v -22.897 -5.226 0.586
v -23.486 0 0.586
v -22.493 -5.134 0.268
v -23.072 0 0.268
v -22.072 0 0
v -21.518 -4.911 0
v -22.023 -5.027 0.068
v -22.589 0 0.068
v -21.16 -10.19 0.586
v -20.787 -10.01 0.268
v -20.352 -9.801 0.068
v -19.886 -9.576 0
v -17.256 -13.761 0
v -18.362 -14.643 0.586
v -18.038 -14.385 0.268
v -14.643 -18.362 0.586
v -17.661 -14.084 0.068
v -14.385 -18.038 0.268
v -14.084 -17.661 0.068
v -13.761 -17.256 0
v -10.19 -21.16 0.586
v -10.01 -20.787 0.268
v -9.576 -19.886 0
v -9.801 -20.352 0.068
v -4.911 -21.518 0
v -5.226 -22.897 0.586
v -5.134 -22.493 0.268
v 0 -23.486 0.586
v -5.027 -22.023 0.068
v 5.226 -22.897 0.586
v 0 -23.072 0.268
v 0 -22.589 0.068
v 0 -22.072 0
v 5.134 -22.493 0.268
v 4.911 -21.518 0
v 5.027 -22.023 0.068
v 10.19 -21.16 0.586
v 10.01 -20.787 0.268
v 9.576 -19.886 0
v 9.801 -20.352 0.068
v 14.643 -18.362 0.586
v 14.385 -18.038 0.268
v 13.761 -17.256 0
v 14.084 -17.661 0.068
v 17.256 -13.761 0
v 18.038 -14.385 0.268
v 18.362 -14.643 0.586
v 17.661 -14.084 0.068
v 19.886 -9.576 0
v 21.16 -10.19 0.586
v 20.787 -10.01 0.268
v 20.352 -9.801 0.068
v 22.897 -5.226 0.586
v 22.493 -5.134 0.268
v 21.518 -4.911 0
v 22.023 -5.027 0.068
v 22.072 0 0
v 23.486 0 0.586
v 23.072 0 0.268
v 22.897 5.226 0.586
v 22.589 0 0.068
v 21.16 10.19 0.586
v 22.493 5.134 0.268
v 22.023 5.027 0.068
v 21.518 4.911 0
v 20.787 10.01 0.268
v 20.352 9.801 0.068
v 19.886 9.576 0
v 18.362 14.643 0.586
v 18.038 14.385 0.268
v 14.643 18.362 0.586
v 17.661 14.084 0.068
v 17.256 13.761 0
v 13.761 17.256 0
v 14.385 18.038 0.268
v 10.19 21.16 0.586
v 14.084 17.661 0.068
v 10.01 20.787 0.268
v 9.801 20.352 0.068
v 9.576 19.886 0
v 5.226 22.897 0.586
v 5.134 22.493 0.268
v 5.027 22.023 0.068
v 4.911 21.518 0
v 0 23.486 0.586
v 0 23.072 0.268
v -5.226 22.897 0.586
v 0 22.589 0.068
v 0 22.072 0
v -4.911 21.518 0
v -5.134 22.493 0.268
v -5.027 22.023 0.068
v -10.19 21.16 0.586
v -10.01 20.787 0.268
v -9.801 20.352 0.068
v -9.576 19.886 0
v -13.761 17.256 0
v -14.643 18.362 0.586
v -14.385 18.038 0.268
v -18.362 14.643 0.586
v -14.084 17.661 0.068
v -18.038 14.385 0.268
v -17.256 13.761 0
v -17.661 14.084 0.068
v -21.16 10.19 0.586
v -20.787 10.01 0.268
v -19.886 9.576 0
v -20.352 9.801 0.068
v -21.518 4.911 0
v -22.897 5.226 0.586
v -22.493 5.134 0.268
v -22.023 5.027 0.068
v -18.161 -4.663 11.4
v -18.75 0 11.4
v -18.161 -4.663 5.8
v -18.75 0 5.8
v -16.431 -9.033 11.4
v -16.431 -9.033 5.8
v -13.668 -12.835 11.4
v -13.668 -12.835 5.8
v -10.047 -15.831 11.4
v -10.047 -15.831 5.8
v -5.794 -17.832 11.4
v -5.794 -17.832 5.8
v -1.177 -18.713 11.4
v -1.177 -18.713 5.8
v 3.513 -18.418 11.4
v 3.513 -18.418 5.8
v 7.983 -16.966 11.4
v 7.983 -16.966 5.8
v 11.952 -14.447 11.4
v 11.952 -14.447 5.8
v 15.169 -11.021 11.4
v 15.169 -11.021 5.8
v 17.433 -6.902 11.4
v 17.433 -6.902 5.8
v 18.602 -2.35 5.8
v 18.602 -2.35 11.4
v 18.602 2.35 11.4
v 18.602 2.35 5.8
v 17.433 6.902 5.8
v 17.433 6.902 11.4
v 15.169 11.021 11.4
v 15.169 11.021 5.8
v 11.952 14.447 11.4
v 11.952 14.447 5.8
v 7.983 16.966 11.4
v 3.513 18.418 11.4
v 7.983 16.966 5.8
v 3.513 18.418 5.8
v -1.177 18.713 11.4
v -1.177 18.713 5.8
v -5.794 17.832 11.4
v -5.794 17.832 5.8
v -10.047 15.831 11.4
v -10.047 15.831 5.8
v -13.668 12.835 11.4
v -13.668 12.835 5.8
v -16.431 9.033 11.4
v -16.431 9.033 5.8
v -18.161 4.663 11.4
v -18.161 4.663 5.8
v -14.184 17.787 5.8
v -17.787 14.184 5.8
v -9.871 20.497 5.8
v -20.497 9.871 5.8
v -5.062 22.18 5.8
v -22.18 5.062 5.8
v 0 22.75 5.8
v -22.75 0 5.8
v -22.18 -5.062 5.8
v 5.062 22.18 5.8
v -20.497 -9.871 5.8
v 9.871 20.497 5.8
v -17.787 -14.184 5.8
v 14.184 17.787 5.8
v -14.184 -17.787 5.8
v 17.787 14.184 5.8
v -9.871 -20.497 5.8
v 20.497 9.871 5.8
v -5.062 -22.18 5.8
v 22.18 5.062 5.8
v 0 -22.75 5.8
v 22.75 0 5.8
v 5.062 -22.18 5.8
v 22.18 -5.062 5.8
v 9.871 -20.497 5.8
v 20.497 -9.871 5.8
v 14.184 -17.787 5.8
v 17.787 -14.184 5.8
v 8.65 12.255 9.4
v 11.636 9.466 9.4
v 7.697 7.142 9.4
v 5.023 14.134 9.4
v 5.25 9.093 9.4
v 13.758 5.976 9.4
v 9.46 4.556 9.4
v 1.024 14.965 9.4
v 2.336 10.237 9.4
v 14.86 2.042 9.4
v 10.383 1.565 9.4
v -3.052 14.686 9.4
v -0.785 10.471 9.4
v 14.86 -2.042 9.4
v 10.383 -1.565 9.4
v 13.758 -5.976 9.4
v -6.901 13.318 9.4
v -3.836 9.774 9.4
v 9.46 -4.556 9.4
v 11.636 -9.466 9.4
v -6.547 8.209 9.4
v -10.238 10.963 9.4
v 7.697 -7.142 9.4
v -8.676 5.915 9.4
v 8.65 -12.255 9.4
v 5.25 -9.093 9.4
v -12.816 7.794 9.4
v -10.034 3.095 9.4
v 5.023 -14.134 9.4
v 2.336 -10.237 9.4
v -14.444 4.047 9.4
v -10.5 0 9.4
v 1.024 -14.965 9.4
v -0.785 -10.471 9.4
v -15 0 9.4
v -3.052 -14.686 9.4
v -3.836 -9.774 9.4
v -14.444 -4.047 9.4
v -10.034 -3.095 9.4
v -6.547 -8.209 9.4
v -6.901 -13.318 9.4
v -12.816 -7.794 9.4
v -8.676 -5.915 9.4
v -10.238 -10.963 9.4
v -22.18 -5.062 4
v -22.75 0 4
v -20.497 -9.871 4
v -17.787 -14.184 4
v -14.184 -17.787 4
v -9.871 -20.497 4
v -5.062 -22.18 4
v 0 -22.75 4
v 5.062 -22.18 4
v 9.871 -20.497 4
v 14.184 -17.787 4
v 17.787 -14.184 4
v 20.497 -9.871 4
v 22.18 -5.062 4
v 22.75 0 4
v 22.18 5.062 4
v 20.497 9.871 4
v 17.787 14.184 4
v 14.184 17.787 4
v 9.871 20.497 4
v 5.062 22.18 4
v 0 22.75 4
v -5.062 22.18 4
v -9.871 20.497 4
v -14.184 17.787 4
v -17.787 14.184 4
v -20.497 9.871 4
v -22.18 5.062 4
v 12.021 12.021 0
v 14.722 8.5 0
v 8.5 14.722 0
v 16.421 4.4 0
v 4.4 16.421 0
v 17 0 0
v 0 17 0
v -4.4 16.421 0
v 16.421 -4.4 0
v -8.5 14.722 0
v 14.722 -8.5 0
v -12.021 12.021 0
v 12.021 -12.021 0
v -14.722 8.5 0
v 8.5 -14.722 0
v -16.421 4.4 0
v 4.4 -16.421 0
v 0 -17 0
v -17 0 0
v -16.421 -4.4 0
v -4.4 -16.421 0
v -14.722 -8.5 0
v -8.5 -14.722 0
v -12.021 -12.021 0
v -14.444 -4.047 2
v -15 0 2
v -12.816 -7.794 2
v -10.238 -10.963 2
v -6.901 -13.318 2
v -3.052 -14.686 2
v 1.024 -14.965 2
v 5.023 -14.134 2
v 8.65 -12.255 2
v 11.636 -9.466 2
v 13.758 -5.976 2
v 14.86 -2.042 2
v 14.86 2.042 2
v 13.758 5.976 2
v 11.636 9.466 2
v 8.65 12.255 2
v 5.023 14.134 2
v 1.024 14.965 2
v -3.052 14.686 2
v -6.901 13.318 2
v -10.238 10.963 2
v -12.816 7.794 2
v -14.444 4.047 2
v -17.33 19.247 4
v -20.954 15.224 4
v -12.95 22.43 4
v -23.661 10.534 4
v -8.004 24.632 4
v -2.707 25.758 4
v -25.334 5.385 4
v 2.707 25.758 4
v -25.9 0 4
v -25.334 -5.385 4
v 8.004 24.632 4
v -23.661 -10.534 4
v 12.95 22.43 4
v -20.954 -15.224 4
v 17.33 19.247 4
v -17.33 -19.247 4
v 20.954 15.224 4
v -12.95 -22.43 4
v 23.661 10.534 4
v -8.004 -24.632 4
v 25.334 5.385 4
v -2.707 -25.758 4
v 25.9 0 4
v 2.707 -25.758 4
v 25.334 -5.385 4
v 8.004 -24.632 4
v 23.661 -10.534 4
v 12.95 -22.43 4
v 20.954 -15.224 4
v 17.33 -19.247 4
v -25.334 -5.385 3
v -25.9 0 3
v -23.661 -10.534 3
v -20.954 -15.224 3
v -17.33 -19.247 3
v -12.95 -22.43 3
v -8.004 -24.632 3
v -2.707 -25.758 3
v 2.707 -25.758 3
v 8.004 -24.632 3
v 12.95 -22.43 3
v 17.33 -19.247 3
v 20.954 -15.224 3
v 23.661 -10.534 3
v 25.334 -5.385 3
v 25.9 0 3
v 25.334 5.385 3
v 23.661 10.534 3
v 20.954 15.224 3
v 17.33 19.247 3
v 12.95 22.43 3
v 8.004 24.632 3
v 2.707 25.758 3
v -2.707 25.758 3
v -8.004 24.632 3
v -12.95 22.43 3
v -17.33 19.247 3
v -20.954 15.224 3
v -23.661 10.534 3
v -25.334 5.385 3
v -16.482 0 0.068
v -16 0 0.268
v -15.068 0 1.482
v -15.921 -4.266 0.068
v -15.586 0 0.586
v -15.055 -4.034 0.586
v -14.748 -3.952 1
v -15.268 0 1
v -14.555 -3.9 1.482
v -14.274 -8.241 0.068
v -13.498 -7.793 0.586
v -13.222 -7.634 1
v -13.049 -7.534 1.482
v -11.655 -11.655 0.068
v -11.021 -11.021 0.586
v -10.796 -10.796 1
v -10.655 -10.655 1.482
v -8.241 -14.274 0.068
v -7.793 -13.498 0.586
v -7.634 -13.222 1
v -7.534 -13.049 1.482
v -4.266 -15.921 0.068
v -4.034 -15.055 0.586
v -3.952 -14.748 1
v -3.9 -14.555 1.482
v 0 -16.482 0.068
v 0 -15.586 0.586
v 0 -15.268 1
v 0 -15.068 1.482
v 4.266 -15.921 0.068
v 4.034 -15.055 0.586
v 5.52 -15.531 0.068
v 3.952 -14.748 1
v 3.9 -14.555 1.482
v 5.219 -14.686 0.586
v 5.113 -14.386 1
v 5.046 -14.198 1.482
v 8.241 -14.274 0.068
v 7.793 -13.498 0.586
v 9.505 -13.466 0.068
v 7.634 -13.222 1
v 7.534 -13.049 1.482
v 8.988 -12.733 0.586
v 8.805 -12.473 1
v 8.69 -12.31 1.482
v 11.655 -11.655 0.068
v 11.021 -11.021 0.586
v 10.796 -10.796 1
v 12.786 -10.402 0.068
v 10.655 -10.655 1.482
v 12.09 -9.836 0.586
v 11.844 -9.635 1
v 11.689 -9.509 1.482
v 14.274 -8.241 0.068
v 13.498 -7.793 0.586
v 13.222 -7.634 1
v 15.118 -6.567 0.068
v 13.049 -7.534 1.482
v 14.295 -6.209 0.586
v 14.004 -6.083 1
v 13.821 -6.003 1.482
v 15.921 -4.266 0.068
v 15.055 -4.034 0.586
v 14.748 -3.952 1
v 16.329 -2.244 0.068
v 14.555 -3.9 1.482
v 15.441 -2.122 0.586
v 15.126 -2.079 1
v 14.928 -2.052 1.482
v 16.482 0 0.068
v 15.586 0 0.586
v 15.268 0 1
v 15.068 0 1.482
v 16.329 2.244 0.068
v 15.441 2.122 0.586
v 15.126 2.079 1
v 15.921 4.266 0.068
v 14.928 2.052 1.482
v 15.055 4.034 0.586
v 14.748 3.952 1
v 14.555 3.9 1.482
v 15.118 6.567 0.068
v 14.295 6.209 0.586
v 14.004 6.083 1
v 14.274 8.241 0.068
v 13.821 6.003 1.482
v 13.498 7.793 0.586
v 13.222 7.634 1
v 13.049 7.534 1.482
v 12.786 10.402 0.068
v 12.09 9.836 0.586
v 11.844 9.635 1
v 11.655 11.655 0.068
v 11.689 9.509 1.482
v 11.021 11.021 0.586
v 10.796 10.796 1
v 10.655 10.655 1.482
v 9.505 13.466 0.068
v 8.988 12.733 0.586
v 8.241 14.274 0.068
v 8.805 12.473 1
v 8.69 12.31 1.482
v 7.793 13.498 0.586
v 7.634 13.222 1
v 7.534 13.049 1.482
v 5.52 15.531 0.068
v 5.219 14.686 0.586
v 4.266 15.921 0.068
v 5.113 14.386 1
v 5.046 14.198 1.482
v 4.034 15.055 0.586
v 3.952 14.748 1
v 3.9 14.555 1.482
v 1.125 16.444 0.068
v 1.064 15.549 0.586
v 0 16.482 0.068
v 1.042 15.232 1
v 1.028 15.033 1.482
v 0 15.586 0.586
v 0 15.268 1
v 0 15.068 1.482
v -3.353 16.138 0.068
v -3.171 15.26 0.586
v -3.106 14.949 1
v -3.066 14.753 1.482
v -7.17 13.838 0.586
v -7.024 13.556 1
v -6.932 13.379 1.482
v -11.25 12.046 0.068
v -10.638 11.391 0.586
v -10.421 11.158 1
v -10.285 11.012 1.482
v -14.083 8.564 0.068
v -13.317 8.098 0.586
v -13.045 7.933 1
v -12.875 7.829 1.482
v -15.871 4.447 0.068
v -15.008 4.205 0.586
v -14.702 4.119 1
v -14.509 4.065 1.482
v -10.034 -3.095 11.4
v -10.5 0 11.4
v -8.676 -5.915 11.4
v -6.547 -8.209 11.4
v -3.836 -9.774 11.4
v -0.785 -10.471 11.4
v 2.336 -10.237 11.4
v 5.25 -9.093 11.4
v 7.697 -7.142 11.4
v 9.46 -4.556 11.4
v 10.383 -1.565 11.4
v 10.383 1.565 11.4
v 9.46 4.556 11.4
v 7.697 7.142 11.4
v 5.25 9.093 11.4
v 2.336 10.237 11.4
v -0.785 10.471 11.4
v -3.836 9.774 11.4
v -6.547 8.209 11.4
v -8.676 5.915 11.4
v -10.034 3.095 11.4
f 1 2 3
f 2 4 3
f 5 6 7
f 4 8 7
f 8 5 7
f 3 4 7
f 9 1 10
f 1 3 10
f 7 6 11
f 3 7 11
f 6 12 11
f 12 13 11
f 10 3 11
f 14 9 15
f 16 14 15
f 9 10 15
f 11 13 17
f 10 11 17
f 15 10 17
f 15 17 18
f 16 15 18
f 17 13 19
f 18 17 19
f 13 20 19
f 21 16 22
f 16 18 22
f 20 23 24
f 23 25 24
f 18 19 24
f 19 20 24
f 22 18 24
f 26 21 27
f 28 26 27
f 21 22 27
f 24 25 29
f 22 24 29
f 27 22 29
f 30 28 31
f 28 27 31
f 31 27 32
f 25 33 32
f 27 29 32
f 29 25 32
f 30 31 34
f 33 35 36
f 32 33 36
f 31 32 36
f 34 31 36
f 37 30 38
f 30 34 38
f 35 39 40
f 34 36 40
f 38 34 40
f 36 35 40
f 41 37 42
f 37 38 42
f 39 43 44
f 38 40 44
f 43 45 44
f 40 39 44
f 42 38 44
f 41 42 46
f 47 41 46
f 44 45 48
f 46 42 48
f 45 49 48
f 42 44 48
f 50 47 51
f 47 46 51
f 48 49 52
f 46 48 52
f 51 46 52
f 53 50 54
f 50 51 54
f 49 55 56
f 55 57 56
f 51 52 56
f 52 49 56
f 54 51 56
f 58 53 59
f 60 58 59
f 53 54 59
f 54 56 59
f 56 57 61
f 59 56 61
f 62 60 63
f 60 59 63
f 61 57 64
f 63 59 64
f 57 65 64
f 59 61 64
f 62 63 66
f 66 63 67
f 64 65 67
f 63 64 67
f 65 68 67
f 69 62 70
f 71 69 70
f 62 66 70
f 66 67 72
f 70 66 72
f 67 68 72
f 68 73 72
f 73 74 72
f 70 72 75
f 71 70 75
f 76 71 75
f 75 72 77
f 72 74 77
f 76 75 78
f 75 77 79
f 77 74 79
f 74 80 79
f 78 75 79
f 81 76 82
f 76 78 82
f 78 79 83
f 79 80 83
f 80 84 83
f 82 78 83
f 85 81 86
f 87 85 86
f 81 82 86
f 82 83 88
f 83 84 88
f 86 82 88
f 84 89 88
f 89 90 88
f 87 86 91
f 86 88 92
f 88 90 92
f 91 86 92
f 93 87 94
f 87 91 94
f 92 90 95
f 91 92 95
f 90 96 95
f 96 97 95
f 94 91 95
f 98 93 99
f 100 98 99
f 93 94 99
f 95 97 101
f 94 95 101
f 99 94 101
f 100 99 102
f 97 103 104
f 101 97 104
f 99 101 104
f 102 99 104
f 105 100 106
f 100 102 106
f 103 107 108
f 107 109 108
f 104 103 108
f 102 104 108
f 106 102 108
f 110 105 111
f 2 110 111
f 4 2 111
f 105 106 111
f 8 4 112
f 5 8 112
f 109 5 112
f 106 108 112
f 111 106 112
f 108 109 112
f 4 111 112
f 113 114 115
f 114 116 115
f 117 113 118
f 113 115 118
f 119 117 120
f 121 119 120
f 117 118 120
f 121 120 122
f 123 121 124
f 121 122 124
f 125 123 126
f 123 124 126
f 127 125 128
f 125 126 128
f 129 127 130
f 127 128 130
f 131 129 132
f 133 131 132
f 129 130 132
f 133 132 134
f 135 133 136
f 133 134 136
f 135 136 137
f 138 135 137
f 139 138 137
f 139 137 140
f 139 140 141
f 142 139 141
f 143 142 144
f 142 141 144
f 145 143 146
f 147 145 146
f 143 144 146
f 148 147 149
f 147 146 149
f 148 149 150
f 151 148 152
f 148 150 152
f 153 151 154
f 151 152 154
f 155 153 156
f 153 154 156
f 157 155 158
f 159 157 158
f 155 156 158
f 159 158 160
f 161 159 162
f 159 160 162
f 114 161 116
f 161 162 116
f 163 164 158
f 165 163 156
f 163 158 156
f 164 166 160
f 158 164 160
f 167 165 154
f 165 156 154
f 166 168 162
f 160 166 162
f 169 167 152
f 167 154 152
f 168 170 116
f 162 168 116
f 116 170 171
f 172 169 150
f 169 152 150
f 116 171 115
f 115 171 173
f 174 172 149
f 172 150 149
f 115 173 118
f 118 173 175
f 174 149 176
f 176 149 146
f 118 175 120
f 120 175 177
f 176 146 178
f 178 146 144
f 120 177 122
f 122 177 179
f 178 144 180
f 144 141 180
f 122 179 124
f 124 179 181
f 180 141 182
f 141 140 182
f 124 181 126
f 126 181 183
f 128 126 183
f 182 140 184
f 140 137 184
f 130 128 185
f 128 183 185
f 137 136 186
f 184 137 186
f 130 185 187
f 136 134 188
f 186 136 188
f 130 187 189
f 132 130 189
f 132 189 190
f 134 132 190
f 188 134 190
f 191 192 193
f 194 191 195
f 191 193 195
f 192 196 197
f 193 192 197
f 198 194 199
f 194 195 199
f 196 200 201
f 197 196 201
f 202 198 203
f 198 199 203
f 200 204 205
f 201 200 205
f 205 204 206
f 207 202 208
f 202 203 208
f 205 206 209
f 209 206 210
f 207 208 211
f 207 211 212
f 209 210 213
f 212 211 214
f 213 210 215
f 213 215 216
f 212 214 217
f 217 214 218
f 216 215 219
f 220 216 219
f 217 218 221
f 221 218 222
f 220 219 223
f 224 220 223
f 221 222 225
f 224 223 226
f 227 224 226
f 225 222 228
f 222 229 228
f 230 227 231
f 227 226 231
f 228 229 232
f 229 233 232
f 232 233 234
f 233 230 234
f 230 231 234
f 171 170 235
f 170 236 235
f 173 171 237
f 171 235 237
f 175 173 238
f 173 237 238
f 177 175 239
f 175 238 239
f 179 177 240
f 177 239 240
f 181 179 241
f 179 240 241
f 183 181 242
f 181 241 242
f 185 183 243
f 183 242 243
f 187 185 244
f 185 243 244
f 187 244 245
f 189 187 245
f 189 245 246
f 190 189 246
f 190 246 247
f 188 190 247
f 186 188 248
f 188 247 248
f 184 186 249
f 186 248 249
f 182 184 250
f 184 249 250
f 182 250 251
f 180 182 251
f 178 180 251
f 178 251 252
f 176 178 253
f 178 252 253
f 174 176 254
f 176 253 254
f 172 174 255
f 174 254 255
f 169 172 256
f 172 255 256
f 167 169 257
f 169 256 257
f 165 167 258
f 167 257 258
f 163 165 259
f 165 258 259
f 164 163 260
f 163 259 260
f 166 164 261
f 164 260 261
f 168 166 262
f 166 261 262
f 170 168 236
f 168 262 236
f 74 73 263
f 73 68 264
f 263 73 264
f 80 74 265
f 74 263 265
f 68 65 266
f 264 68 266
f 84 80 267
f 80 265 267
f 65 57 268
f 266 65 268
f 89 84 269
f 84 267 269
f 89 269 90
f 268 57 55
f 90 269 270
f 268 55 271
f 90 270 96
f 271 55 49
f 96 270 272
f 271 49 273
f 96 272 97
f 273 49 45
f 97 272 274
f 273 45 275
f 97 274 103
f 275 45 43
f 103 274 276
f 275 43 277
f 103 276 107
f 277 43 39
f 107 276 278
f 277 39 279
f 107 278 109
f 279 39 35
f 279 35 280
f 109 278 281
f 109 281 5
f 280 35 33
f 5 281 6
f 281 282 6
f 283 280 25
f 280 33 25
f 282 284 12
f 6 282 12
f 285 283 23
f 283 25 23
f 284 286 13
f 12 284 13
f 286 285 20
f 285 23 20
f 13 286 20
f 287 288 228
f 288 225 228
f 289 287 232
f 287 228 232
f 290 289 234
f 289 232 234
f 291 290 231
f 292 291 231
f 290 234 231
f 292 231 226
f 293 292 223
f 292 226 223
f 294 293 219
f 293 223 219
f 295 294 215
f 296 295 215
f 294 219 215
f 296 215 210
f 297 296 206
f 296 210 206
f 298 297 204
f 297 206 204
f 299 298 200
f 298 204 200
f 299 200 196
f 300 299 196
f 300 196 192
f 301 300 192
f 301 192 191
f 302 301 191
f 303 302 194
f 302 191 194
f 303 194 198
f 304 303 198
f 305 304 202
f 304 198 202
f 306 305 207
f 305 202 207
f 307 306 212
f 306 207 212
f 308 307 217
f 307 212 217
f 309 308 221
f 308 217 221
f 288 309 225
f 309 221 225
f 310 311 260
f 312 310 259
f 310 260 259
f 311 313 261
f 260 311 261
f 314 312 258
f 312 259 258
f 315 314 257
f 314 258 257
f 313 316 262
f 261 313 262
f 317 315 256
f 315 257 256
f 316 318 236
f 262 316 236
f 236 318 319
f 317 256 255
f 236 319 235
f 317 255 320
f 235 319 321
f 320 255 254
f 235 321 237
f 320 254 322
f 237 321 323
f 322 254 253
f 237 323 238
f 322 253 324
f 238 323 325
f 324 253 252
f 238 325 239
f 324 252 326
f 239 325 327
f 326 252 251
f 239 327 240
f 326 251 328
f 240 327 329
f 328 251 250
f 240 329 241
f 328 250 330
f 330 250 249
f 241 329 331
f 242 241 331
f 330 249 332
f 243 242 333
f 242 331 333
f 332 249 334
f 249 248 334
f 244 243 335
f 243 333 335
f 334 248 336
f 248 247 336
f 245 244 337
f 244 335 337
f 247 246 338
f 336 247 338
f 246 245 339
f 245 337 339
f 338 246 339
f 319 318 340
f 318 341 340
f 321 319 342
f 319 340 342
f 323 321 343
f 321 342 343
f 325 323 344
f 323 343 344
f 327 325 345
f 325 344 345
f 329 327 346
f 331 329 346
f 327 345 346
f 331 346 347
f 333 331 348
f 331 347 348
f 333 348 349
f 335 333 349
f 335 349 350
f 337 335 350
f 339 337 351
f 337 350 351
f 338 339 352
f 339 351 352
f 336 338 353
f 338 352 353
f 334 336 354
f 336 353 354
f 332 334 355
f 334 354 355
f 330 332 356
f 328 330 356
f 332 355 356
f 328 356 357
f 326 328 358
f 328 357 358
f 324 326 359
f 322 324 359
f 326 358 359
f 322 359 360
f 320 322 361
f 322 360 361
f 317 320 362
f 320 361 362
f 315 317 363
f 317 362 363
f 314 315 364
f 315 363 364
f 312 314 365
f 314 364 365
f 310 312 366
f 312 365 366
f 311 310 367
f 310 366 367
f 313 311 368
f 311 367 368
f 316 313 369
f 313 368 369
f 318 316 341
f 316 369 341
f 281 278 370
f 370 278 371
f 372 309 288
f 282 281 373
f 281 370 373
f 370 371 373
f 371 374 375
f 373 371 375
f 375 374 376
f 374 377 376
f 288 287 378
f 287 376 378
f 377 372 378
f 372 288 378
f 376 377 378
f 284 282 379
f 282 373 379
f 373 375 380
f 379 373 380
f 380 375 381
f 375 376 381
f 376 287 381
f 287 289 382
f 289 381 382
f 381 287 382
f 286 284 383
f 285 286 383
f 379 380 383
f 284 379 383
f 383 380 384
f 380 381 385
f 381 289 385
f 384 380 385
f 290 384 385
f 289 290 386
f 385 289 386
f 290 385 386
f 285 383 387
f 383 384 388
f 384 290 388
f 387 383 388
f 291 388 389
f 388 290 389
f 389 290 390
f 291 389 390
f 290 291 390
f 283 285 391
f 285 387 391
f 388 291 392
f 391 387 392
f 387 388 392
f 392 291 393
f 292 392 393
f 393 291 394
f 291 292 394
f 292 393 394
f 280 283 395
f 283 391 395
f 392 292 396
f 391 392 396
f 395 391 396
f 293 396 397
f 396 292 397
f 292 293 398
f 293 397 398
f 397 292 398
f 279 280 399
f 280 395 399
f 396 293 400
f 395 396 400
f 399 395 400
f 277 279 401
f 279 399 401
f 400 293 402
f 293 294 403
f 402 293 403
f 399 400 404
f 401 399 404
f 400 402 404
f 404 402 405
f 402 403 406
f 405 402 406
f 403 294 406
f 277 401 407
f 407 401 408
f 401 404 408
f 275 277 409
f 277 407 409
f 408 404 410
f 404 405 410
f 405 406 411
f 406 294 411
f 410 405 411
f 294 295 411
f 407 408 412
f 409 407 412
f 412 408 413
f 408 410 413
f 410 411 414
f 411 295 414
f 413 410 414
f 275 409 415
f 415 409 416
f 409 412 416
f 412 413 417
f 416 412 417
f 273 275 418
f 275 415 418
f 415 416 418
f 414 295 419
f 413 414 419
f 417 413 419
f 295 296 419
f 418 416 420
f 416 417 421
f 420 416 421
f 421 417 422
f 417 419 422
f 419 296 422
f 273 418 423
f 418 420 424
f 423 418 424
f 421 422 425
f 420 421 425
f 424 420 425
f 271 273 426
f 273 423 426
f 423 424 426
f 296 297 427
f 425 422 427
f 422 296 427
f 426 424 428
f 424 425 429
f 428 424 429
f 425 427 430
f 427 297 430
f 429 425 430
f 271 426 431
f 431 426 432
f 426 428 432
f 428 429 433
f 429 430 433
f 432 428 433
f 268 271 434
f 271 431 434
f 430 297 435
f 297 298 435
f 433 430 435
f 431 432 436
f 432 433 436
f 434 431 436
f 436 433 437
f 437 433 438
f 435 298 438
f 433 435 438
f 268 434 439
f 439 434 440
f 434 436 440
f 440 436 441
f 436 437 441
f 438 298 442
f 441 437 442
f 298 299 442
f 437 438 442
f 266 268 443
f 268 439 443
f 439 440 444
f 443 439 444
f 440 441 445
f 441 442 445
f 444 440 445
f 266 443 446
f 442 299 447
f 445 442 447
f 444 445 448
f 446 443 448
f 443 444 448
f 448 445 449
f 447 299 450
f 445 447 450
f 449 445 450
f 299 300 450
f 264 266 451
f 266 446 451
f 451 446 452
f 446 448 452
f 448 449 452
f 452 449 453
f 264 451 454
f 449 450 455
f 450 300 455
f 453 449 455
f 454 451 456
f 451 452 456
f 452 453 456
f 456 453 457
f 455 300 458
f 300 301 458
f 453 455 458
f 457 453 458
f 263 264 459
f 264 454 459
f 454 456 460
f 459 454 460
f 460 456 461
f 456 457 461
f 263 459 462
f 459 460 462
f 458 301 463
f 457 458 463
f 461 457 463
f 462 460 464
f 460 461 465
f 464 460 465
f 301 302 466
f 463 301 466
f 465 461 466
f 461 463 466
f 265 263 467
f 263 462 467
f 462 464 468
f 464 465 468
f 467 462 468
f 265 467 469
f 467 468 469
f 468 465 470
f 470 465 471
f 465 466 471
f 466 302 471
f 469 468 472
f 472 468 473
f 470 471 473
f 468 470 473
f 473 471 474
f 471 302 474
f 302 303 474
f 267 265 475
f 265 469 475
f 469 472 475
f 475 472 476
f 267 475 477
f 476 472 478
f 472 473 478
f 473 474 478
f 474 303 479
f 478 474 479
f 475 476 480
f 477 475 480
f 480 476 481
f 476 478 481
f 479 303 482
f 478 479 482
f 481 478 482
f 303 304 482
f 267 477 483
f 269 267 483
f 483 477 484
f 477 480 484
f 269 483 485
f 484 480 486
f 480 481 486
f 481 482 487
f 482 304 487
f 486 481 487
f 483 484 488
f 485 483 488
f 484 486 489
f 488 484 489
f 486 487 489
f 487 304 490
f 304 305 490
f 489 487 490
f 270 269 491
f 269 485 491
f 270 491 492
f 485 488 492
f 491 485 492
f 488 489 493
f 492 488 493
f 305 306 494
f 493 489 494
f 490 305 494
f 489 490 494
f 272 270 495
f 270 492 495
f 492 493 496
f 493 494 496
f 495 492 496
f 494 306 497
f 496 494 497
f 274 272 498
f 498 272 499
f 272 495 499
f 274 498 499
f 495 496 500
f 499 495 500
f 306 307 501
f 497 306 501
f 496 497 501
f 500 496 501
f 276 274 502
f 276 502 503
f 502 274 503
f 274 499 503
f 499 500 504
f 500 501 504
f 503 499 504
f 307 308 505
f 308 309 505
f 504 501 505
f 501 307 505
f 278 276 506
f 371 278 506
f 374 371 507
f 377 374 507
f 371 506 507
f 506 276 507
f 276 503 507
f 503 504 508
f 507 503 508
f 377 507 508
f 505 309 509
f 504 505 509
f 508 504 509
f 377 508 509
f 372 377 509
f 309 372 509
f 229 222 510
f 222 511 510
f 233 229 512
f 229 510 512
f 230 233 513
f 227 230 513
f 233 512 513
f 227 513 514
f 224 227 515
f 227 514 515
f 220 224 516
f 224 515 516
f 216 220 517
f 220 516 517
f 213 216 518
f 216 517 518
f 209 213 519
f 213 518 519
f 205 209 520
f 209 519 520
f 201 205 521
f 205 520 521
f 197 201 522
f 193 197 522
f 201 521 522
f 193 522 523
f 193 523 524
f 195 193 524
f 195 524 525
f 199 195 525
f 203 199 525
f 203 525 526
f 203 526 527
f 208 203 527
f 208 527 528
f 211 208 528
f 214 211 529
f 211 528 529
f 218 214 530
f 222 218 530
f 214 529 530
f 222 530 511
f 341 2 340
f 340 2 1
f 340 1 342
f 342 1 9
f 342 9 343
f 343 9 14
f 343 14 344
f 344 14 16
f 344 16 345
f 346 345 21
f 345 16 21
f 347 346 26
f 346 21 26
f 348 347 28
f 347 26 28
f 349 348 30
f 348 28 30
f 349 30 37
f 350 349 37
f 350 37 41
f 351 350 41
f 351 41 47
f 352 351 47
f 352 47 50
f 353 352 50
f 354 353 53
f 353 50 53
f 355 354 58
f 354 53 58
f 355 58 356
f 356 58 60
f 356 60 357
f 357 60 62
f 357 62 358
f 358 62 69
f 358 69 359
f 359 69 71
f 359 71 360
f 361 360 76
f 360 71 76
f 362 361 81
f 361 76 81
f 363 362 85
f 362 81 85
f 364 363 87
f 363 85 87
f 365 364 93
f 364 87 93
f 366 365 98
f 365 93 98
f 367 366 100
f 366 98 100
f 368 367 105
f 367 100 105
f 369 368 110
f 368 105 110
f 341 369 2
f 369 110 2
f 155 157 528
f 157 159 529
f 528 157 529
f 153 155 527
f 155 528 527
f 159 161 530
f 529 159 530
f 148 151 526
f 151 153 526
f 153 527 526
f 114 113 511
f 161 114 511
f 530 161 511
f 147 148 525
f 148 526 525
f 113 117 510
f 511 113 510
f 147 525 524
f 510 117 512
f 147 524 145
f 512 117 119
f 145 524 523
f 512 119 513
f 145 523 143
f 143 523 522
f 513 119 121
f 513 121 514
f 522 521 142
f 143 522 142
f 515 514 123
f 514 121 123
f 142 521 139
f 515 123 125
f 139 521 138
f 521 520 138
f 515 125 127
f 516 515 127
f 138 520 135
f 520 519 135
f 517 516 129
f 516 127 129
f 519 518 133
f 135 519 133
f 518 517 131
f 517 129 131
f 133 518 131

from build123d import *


with BuildPart() as f1:
    # F0 (on Front) → F1 (revolve)
    with BuildSketch(Plane.XZ):
        with BuildLine():
            Line((-22.071573, 0), (-17, 0))
            ThreePointArc((-17, 0), (-15.585786, 0.585786), (-15, 2))
            Line((-15, 2), (-15, 9.4))
            Line((-15, 9.4), (-10.5, 9.4))
            Line((-10.5, 9.4), (-10.5, 11.4))
            Line((-10.5, 11.4), (-18.75, 11.4))
            Line((-18.75, 11.4), (-18.75, 5.8))
            Line((-18.75, 5.8), (-22.75, 5.8))
            Line((-22.75, 5.8), (-22.75, 4))
            Line((-22.75, 4), (-25.9, 4))
            Line((-25.9, 4), (-25.9, 3))
            Line((-25.9, 3), (-23.485786, 0.585786))
            ThreePointArc((-23.485786, 0.585786), (-22.83694, 0.152241), (-22.071573, 0))
        make_face()
    revolve(axis=Axis((0, 0, 5.7), (0, 0, 1)))


solid = f1.part
